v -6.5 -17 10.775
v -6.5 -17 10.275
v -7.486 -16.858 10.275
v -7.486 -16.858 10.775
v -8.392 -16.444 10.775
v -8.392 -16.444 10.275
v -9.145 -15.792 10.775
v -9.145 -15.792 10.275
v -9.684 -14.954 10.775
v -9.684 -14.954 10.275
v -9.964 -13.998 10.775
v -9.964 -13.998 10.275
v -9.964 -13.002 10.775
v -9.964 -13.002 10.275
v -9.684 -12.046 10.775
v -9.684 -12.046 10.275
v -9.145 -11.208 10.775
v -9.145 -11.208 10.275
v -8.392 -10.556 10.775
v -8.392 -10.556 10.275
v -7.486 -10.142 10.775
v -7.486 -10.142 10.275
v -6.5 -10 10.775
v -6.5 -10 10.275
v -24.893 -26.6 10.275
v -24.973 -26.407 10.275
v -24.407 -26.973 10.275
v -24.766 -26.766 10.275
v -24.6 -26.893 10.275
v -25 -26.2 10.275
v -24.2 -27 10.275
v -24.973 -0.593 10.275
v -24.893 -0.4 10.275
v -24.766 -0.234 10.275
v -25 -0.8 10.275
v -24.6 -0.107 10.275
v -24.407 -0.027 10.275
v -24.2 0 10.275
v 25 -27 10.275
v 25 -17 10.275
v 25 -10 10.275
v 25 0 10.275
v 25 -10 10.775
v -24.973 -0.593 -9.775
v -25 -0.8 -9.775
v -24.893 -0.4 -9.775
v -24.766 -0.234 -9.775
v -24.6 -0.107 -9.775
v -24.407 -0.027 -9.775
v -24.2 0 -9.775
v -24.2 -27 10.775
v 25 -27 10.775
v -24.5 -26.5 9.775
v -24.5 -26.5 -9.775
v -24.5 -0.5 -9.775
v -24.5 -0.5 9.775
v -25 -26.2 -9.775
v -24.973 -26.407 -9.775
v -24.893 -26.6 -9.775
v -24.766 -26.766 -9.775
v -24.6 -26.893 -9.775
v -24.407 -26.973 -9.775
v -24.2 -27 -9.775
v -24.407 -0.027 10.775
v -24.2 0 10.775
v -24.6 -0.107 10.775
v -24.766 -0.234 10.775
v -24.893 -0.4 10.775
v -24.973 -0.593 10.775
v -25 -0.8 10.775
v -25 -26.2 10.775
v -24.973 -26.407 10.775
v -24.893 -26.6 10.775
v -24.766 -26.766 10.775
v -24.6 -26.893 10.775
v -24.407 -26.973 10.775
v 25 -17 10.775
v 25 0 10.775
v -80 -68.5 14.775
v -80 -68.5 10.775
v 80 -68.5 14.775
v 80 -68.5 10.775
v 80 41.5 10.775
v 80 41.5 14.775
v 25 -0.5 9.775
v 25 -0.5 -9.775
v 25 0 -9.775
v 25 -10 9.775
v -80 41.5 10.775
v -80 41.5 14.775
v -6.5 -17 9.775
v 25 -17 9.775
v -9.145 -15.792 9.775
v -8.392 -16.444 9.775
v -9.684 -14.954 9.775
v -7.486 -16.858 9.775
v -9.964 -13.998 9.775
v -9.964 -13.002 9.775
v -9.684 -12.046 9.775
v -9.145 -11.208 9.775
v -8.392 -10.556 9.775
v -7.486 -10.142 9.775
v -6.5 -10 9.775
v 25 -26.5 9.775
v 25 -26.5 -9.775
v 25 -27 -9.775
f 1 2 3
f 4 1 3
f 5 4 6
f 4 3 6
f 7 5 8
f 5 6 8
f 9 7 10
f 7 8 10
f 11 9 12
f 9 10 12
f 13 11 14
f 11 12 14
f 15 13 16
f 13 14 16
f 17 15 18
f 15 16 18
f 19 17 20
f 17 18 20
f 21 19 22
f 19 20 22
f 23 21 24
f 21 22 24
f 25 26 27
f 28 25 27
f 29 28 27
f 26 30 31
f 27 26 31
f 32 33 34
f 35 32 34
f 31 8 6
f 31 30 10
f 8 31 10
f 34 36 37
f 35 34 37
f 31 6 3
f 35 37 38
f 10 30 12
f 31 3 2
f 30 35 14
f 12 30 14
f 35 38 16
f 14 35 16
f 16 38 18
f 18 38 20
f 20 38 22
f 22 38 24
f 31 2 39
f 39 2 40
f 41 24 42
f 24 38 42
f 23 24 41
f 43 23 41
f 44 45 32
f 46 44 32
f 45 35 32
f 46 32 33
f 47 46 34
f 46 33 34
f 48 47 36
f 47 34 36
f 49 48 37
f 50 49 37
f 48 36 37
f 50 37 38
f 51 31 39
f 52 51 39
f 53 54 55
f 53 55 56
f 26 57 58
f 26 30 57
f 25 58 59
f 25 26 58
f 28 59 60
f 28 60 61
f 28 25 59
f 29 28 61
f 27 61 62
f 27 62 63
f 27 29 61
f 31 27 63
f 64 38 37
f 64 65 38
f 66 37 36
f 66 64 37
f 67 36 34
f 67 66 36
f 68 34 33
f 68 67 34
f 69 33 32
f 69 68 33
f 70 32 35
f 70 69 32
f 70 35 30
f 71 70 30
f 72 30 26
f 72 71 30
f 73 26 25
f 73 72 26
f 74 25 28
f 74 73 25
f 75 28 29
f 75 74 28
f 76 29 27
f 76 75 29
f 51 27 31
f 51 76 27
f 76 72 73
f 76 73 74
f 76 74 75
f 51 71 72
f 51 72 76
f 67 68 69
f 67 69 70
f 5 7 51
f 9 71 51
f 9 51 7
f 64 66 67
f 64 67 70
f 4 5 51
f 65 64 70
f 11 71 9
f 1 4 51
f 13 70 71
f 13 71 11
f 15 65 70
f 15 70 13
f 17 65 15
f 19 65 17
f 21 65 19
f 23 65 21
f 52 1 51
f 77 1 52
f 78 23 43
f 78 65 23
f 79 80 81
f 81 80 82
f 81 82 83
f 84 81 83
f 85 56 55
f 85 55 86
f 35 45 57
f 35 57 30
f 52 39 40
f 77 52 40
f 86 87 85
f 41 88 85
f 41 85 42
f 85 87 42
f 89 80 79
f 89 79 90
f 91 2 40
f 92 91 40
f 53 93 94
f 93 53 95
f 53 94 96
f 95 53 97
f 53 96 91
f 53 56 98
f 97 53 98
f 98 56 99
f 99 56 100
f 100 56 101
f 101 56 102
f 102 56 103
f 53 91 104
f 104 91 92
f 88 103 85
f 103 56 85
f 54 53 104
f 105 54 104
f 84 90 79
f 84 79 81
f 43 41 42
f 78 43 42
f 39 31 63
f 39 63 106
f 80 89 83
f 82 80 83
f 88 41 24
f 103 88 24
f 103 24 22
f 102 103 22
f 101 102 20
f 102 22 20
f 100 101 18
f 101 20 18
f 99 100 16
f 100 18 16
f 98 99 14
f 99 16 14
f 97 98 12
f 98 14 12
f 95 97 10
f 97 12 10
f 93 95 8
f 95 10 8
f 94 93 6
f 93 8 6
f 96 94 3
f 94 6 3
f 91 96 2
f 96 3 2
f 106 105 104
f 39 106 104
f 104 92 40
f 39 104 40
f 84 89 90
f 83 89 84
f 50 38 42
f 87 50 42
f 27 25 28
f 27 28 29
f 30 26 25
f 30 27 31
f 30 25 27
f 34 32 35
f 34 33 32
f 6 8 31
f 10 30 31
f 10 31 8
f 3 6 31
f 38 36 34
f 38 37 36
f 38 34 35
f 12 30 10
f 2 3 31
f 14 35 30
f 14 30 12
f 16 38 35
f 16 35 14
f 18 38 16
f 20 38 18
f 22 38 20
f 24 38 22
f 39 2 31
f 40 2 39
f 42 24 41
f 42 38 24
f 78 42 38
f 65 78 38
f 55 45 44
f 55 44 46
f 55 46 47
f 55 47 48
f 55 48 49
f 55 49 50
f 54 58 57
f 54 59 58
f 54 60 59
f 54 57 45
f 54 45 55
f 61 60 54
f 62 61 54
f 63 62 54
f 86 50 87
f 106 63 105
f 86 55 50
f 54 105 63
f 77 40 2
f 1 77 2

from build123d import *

# Parameters (mm, degrees)
F0_W      = 50
F0_H      = 20.55
F1_DEPTH  = 27
F2_T      = -0.5
F4_DEPTH  = 25
F6_DEPTH  = 0.5
F8_DEPTH  = 0.5
F9_R      = 0.8
F9_2_R    = 0.8
F10_W     = 160
F10_H     = 110
F11_DEPTH = 4


with BuildPart() as f1:
    # F0 (on Front) → F1 (new body)
    with BuildSketch(Plane.XZ):
        Rectangle(F0_W, F0_H)
    extrude(amount=F1_DEPTH)

    # F2
    f2_openings = [f1.faces().sort_by_distance(p)[0] for p in [
        (25, -13.5, 0),
    ]]
    offset(amount=F2_T, openings=f2_openings)

    # F3 (on face) → F4 (cut)
    with BuildSketch(Plane.XY.offset(10.275)):
        with BuildLine():
            ThreePointArc((-6.5, -17), (-4.0251262658, -15.9748737342), (-3, -13.5))
            ThreePointArc((-3, -13.5), (-4.0251262658, -11.0251262658), (-6.5, -10))
            ThreePointArc((-6.5, -10), (-10, -13.5), (-6.5, -17))
        make_face()
        with BuildLine():
            ThreePointArc((-6.5, -10), (-4.0251262658, -11.0251262658), (-3, -13.5))
            ThreePointArc((-3, -13.5), (-4.0251262658, -15.9748737342), (-6.5, -17))
            Line((-6.5, -17), (25, -17))
            Line((25, -17), (25, -10))
            Line((25, -10), (-6.5, -10))
        make_face()
    extrude(amount=-F4_DEPTH, mode=Mode.SUBTRACT)

    # F5 (on face) → F6 (cut)
    with BuildSketch(Plane(origin=(0, 0, -10.275), x_dir=(1, 0, 0), z_dir=(0, 0, -1))):
        with BuildLine():
            Line((25, 27), (-25, 27))
            Line((-25, 27), (-25, 0))
            Line((-25, 0), (25, 0))
            Line((25, 0), (25, 10))
            Line((25, 10), (-6.5, 10))
            ThreePointArc((-6.5, 10), (-10, 13.5), (-6.5, 17))
            Line((-6.5, 17), (25, 17))
            Line((25, 17), (25, 27))
        make_face()
    extrude(amount=-F6_DEPTH, mode=Mode.SUBTRACT)

    # F9
    f9_edges = [f1.edges().sort_by_distance(p)[0] for p in [
        (-25, -27, 0.25),
        (-25, 0, 0.25),
    ]]
    fillet(f9_edges, radius=F9_R)


with BuildPart() as f8:
    # F7 (on face) → F8 (new body)
    with BuildSketch(Plane.XY.offset(10.275)):
        with BuildLine():
            Line((25, -10), (25, 0))
            Line((25, 0), (-25, 0))
            Line((-25, 0), (-25, -27))
            Line((-25, -27), (25, -27))
            Line((25, -27), (25, -17))
            Line((25, -17), (-6.5, -17))
            ThreePointArc((-6.5, -17), (-10, -13.5), (-6.5, -10))
            Line((-6.5, -10), (25, -10))
        make_face()
    extrude(amount=F8_DEPTH)

    # F9#2
    f9_2_edges = [f8.edges().sort_by_distance(p)[0] for p in [
        (-25, -27, 10.525),
        (-25, 0, 10.525),
    ]]
    fillet(f9_2_edges, radius=F9_2_R)


with BuildPart() as f11:
    # F10 (on face) → F11 (new body)
    with BuildSketch(Plane.XY.offset(10.775)):
        with Locations((0, -13.5)):
            Rectangle(F10_W, F10_H)
        with BuildLine():
            Line((-24.2, 0), (25, 0))
            Line((25, 0), (25, -10))
            Line((25, -10), (-6.5, -10))
            ThreePointArc((-6.5, -10), (-10, -13.5), (-6.5, -17))
            Line((-6.5, -17), (25, -17))
            Line((25, -17), (25, -27))
            Line((25, -27), (-24.2, -27))
            ThreePointArc((-24.2, -27), (-24.7656854249, -26.7656854249), (-25, -26.2))
            Line((-25, -26.2), (-25, -0.8))
            ThreePointArc((-25, -0.8), (-24.7656854249, -0.2343145751), (-24.2, 0))
        make_face(mode=Mode.SUBTRACT)
        with BuildLine():
            Line((25, -10), (25, 0))
            Line((25, 0), (-24.2, 0))
            ThreePointArc((-24.2, 0), (-24.7656854249, -0.2343145751), (-25, -0.8))
            Line((-25, -0.8), (-25, -26.2))
            ThreePointArc((-25, -26.2), (-24.7656854249, -26.7656854249), (-24.2, -27))
            Line((-24.2, -27), (25, -27))
            Line((25, -27), (25, -17))
            Line((25, -17), (-6.5, -17))
            ThreePointArc((-6.5, -17), (-10, -13.5), (-6.5, -10))
            Line((-6.5, -10), (25, -10))
        make_face()
    extrude(amount=F11_DEPTH)


solid = Compound([f1.part, f8.part, f11.part])
